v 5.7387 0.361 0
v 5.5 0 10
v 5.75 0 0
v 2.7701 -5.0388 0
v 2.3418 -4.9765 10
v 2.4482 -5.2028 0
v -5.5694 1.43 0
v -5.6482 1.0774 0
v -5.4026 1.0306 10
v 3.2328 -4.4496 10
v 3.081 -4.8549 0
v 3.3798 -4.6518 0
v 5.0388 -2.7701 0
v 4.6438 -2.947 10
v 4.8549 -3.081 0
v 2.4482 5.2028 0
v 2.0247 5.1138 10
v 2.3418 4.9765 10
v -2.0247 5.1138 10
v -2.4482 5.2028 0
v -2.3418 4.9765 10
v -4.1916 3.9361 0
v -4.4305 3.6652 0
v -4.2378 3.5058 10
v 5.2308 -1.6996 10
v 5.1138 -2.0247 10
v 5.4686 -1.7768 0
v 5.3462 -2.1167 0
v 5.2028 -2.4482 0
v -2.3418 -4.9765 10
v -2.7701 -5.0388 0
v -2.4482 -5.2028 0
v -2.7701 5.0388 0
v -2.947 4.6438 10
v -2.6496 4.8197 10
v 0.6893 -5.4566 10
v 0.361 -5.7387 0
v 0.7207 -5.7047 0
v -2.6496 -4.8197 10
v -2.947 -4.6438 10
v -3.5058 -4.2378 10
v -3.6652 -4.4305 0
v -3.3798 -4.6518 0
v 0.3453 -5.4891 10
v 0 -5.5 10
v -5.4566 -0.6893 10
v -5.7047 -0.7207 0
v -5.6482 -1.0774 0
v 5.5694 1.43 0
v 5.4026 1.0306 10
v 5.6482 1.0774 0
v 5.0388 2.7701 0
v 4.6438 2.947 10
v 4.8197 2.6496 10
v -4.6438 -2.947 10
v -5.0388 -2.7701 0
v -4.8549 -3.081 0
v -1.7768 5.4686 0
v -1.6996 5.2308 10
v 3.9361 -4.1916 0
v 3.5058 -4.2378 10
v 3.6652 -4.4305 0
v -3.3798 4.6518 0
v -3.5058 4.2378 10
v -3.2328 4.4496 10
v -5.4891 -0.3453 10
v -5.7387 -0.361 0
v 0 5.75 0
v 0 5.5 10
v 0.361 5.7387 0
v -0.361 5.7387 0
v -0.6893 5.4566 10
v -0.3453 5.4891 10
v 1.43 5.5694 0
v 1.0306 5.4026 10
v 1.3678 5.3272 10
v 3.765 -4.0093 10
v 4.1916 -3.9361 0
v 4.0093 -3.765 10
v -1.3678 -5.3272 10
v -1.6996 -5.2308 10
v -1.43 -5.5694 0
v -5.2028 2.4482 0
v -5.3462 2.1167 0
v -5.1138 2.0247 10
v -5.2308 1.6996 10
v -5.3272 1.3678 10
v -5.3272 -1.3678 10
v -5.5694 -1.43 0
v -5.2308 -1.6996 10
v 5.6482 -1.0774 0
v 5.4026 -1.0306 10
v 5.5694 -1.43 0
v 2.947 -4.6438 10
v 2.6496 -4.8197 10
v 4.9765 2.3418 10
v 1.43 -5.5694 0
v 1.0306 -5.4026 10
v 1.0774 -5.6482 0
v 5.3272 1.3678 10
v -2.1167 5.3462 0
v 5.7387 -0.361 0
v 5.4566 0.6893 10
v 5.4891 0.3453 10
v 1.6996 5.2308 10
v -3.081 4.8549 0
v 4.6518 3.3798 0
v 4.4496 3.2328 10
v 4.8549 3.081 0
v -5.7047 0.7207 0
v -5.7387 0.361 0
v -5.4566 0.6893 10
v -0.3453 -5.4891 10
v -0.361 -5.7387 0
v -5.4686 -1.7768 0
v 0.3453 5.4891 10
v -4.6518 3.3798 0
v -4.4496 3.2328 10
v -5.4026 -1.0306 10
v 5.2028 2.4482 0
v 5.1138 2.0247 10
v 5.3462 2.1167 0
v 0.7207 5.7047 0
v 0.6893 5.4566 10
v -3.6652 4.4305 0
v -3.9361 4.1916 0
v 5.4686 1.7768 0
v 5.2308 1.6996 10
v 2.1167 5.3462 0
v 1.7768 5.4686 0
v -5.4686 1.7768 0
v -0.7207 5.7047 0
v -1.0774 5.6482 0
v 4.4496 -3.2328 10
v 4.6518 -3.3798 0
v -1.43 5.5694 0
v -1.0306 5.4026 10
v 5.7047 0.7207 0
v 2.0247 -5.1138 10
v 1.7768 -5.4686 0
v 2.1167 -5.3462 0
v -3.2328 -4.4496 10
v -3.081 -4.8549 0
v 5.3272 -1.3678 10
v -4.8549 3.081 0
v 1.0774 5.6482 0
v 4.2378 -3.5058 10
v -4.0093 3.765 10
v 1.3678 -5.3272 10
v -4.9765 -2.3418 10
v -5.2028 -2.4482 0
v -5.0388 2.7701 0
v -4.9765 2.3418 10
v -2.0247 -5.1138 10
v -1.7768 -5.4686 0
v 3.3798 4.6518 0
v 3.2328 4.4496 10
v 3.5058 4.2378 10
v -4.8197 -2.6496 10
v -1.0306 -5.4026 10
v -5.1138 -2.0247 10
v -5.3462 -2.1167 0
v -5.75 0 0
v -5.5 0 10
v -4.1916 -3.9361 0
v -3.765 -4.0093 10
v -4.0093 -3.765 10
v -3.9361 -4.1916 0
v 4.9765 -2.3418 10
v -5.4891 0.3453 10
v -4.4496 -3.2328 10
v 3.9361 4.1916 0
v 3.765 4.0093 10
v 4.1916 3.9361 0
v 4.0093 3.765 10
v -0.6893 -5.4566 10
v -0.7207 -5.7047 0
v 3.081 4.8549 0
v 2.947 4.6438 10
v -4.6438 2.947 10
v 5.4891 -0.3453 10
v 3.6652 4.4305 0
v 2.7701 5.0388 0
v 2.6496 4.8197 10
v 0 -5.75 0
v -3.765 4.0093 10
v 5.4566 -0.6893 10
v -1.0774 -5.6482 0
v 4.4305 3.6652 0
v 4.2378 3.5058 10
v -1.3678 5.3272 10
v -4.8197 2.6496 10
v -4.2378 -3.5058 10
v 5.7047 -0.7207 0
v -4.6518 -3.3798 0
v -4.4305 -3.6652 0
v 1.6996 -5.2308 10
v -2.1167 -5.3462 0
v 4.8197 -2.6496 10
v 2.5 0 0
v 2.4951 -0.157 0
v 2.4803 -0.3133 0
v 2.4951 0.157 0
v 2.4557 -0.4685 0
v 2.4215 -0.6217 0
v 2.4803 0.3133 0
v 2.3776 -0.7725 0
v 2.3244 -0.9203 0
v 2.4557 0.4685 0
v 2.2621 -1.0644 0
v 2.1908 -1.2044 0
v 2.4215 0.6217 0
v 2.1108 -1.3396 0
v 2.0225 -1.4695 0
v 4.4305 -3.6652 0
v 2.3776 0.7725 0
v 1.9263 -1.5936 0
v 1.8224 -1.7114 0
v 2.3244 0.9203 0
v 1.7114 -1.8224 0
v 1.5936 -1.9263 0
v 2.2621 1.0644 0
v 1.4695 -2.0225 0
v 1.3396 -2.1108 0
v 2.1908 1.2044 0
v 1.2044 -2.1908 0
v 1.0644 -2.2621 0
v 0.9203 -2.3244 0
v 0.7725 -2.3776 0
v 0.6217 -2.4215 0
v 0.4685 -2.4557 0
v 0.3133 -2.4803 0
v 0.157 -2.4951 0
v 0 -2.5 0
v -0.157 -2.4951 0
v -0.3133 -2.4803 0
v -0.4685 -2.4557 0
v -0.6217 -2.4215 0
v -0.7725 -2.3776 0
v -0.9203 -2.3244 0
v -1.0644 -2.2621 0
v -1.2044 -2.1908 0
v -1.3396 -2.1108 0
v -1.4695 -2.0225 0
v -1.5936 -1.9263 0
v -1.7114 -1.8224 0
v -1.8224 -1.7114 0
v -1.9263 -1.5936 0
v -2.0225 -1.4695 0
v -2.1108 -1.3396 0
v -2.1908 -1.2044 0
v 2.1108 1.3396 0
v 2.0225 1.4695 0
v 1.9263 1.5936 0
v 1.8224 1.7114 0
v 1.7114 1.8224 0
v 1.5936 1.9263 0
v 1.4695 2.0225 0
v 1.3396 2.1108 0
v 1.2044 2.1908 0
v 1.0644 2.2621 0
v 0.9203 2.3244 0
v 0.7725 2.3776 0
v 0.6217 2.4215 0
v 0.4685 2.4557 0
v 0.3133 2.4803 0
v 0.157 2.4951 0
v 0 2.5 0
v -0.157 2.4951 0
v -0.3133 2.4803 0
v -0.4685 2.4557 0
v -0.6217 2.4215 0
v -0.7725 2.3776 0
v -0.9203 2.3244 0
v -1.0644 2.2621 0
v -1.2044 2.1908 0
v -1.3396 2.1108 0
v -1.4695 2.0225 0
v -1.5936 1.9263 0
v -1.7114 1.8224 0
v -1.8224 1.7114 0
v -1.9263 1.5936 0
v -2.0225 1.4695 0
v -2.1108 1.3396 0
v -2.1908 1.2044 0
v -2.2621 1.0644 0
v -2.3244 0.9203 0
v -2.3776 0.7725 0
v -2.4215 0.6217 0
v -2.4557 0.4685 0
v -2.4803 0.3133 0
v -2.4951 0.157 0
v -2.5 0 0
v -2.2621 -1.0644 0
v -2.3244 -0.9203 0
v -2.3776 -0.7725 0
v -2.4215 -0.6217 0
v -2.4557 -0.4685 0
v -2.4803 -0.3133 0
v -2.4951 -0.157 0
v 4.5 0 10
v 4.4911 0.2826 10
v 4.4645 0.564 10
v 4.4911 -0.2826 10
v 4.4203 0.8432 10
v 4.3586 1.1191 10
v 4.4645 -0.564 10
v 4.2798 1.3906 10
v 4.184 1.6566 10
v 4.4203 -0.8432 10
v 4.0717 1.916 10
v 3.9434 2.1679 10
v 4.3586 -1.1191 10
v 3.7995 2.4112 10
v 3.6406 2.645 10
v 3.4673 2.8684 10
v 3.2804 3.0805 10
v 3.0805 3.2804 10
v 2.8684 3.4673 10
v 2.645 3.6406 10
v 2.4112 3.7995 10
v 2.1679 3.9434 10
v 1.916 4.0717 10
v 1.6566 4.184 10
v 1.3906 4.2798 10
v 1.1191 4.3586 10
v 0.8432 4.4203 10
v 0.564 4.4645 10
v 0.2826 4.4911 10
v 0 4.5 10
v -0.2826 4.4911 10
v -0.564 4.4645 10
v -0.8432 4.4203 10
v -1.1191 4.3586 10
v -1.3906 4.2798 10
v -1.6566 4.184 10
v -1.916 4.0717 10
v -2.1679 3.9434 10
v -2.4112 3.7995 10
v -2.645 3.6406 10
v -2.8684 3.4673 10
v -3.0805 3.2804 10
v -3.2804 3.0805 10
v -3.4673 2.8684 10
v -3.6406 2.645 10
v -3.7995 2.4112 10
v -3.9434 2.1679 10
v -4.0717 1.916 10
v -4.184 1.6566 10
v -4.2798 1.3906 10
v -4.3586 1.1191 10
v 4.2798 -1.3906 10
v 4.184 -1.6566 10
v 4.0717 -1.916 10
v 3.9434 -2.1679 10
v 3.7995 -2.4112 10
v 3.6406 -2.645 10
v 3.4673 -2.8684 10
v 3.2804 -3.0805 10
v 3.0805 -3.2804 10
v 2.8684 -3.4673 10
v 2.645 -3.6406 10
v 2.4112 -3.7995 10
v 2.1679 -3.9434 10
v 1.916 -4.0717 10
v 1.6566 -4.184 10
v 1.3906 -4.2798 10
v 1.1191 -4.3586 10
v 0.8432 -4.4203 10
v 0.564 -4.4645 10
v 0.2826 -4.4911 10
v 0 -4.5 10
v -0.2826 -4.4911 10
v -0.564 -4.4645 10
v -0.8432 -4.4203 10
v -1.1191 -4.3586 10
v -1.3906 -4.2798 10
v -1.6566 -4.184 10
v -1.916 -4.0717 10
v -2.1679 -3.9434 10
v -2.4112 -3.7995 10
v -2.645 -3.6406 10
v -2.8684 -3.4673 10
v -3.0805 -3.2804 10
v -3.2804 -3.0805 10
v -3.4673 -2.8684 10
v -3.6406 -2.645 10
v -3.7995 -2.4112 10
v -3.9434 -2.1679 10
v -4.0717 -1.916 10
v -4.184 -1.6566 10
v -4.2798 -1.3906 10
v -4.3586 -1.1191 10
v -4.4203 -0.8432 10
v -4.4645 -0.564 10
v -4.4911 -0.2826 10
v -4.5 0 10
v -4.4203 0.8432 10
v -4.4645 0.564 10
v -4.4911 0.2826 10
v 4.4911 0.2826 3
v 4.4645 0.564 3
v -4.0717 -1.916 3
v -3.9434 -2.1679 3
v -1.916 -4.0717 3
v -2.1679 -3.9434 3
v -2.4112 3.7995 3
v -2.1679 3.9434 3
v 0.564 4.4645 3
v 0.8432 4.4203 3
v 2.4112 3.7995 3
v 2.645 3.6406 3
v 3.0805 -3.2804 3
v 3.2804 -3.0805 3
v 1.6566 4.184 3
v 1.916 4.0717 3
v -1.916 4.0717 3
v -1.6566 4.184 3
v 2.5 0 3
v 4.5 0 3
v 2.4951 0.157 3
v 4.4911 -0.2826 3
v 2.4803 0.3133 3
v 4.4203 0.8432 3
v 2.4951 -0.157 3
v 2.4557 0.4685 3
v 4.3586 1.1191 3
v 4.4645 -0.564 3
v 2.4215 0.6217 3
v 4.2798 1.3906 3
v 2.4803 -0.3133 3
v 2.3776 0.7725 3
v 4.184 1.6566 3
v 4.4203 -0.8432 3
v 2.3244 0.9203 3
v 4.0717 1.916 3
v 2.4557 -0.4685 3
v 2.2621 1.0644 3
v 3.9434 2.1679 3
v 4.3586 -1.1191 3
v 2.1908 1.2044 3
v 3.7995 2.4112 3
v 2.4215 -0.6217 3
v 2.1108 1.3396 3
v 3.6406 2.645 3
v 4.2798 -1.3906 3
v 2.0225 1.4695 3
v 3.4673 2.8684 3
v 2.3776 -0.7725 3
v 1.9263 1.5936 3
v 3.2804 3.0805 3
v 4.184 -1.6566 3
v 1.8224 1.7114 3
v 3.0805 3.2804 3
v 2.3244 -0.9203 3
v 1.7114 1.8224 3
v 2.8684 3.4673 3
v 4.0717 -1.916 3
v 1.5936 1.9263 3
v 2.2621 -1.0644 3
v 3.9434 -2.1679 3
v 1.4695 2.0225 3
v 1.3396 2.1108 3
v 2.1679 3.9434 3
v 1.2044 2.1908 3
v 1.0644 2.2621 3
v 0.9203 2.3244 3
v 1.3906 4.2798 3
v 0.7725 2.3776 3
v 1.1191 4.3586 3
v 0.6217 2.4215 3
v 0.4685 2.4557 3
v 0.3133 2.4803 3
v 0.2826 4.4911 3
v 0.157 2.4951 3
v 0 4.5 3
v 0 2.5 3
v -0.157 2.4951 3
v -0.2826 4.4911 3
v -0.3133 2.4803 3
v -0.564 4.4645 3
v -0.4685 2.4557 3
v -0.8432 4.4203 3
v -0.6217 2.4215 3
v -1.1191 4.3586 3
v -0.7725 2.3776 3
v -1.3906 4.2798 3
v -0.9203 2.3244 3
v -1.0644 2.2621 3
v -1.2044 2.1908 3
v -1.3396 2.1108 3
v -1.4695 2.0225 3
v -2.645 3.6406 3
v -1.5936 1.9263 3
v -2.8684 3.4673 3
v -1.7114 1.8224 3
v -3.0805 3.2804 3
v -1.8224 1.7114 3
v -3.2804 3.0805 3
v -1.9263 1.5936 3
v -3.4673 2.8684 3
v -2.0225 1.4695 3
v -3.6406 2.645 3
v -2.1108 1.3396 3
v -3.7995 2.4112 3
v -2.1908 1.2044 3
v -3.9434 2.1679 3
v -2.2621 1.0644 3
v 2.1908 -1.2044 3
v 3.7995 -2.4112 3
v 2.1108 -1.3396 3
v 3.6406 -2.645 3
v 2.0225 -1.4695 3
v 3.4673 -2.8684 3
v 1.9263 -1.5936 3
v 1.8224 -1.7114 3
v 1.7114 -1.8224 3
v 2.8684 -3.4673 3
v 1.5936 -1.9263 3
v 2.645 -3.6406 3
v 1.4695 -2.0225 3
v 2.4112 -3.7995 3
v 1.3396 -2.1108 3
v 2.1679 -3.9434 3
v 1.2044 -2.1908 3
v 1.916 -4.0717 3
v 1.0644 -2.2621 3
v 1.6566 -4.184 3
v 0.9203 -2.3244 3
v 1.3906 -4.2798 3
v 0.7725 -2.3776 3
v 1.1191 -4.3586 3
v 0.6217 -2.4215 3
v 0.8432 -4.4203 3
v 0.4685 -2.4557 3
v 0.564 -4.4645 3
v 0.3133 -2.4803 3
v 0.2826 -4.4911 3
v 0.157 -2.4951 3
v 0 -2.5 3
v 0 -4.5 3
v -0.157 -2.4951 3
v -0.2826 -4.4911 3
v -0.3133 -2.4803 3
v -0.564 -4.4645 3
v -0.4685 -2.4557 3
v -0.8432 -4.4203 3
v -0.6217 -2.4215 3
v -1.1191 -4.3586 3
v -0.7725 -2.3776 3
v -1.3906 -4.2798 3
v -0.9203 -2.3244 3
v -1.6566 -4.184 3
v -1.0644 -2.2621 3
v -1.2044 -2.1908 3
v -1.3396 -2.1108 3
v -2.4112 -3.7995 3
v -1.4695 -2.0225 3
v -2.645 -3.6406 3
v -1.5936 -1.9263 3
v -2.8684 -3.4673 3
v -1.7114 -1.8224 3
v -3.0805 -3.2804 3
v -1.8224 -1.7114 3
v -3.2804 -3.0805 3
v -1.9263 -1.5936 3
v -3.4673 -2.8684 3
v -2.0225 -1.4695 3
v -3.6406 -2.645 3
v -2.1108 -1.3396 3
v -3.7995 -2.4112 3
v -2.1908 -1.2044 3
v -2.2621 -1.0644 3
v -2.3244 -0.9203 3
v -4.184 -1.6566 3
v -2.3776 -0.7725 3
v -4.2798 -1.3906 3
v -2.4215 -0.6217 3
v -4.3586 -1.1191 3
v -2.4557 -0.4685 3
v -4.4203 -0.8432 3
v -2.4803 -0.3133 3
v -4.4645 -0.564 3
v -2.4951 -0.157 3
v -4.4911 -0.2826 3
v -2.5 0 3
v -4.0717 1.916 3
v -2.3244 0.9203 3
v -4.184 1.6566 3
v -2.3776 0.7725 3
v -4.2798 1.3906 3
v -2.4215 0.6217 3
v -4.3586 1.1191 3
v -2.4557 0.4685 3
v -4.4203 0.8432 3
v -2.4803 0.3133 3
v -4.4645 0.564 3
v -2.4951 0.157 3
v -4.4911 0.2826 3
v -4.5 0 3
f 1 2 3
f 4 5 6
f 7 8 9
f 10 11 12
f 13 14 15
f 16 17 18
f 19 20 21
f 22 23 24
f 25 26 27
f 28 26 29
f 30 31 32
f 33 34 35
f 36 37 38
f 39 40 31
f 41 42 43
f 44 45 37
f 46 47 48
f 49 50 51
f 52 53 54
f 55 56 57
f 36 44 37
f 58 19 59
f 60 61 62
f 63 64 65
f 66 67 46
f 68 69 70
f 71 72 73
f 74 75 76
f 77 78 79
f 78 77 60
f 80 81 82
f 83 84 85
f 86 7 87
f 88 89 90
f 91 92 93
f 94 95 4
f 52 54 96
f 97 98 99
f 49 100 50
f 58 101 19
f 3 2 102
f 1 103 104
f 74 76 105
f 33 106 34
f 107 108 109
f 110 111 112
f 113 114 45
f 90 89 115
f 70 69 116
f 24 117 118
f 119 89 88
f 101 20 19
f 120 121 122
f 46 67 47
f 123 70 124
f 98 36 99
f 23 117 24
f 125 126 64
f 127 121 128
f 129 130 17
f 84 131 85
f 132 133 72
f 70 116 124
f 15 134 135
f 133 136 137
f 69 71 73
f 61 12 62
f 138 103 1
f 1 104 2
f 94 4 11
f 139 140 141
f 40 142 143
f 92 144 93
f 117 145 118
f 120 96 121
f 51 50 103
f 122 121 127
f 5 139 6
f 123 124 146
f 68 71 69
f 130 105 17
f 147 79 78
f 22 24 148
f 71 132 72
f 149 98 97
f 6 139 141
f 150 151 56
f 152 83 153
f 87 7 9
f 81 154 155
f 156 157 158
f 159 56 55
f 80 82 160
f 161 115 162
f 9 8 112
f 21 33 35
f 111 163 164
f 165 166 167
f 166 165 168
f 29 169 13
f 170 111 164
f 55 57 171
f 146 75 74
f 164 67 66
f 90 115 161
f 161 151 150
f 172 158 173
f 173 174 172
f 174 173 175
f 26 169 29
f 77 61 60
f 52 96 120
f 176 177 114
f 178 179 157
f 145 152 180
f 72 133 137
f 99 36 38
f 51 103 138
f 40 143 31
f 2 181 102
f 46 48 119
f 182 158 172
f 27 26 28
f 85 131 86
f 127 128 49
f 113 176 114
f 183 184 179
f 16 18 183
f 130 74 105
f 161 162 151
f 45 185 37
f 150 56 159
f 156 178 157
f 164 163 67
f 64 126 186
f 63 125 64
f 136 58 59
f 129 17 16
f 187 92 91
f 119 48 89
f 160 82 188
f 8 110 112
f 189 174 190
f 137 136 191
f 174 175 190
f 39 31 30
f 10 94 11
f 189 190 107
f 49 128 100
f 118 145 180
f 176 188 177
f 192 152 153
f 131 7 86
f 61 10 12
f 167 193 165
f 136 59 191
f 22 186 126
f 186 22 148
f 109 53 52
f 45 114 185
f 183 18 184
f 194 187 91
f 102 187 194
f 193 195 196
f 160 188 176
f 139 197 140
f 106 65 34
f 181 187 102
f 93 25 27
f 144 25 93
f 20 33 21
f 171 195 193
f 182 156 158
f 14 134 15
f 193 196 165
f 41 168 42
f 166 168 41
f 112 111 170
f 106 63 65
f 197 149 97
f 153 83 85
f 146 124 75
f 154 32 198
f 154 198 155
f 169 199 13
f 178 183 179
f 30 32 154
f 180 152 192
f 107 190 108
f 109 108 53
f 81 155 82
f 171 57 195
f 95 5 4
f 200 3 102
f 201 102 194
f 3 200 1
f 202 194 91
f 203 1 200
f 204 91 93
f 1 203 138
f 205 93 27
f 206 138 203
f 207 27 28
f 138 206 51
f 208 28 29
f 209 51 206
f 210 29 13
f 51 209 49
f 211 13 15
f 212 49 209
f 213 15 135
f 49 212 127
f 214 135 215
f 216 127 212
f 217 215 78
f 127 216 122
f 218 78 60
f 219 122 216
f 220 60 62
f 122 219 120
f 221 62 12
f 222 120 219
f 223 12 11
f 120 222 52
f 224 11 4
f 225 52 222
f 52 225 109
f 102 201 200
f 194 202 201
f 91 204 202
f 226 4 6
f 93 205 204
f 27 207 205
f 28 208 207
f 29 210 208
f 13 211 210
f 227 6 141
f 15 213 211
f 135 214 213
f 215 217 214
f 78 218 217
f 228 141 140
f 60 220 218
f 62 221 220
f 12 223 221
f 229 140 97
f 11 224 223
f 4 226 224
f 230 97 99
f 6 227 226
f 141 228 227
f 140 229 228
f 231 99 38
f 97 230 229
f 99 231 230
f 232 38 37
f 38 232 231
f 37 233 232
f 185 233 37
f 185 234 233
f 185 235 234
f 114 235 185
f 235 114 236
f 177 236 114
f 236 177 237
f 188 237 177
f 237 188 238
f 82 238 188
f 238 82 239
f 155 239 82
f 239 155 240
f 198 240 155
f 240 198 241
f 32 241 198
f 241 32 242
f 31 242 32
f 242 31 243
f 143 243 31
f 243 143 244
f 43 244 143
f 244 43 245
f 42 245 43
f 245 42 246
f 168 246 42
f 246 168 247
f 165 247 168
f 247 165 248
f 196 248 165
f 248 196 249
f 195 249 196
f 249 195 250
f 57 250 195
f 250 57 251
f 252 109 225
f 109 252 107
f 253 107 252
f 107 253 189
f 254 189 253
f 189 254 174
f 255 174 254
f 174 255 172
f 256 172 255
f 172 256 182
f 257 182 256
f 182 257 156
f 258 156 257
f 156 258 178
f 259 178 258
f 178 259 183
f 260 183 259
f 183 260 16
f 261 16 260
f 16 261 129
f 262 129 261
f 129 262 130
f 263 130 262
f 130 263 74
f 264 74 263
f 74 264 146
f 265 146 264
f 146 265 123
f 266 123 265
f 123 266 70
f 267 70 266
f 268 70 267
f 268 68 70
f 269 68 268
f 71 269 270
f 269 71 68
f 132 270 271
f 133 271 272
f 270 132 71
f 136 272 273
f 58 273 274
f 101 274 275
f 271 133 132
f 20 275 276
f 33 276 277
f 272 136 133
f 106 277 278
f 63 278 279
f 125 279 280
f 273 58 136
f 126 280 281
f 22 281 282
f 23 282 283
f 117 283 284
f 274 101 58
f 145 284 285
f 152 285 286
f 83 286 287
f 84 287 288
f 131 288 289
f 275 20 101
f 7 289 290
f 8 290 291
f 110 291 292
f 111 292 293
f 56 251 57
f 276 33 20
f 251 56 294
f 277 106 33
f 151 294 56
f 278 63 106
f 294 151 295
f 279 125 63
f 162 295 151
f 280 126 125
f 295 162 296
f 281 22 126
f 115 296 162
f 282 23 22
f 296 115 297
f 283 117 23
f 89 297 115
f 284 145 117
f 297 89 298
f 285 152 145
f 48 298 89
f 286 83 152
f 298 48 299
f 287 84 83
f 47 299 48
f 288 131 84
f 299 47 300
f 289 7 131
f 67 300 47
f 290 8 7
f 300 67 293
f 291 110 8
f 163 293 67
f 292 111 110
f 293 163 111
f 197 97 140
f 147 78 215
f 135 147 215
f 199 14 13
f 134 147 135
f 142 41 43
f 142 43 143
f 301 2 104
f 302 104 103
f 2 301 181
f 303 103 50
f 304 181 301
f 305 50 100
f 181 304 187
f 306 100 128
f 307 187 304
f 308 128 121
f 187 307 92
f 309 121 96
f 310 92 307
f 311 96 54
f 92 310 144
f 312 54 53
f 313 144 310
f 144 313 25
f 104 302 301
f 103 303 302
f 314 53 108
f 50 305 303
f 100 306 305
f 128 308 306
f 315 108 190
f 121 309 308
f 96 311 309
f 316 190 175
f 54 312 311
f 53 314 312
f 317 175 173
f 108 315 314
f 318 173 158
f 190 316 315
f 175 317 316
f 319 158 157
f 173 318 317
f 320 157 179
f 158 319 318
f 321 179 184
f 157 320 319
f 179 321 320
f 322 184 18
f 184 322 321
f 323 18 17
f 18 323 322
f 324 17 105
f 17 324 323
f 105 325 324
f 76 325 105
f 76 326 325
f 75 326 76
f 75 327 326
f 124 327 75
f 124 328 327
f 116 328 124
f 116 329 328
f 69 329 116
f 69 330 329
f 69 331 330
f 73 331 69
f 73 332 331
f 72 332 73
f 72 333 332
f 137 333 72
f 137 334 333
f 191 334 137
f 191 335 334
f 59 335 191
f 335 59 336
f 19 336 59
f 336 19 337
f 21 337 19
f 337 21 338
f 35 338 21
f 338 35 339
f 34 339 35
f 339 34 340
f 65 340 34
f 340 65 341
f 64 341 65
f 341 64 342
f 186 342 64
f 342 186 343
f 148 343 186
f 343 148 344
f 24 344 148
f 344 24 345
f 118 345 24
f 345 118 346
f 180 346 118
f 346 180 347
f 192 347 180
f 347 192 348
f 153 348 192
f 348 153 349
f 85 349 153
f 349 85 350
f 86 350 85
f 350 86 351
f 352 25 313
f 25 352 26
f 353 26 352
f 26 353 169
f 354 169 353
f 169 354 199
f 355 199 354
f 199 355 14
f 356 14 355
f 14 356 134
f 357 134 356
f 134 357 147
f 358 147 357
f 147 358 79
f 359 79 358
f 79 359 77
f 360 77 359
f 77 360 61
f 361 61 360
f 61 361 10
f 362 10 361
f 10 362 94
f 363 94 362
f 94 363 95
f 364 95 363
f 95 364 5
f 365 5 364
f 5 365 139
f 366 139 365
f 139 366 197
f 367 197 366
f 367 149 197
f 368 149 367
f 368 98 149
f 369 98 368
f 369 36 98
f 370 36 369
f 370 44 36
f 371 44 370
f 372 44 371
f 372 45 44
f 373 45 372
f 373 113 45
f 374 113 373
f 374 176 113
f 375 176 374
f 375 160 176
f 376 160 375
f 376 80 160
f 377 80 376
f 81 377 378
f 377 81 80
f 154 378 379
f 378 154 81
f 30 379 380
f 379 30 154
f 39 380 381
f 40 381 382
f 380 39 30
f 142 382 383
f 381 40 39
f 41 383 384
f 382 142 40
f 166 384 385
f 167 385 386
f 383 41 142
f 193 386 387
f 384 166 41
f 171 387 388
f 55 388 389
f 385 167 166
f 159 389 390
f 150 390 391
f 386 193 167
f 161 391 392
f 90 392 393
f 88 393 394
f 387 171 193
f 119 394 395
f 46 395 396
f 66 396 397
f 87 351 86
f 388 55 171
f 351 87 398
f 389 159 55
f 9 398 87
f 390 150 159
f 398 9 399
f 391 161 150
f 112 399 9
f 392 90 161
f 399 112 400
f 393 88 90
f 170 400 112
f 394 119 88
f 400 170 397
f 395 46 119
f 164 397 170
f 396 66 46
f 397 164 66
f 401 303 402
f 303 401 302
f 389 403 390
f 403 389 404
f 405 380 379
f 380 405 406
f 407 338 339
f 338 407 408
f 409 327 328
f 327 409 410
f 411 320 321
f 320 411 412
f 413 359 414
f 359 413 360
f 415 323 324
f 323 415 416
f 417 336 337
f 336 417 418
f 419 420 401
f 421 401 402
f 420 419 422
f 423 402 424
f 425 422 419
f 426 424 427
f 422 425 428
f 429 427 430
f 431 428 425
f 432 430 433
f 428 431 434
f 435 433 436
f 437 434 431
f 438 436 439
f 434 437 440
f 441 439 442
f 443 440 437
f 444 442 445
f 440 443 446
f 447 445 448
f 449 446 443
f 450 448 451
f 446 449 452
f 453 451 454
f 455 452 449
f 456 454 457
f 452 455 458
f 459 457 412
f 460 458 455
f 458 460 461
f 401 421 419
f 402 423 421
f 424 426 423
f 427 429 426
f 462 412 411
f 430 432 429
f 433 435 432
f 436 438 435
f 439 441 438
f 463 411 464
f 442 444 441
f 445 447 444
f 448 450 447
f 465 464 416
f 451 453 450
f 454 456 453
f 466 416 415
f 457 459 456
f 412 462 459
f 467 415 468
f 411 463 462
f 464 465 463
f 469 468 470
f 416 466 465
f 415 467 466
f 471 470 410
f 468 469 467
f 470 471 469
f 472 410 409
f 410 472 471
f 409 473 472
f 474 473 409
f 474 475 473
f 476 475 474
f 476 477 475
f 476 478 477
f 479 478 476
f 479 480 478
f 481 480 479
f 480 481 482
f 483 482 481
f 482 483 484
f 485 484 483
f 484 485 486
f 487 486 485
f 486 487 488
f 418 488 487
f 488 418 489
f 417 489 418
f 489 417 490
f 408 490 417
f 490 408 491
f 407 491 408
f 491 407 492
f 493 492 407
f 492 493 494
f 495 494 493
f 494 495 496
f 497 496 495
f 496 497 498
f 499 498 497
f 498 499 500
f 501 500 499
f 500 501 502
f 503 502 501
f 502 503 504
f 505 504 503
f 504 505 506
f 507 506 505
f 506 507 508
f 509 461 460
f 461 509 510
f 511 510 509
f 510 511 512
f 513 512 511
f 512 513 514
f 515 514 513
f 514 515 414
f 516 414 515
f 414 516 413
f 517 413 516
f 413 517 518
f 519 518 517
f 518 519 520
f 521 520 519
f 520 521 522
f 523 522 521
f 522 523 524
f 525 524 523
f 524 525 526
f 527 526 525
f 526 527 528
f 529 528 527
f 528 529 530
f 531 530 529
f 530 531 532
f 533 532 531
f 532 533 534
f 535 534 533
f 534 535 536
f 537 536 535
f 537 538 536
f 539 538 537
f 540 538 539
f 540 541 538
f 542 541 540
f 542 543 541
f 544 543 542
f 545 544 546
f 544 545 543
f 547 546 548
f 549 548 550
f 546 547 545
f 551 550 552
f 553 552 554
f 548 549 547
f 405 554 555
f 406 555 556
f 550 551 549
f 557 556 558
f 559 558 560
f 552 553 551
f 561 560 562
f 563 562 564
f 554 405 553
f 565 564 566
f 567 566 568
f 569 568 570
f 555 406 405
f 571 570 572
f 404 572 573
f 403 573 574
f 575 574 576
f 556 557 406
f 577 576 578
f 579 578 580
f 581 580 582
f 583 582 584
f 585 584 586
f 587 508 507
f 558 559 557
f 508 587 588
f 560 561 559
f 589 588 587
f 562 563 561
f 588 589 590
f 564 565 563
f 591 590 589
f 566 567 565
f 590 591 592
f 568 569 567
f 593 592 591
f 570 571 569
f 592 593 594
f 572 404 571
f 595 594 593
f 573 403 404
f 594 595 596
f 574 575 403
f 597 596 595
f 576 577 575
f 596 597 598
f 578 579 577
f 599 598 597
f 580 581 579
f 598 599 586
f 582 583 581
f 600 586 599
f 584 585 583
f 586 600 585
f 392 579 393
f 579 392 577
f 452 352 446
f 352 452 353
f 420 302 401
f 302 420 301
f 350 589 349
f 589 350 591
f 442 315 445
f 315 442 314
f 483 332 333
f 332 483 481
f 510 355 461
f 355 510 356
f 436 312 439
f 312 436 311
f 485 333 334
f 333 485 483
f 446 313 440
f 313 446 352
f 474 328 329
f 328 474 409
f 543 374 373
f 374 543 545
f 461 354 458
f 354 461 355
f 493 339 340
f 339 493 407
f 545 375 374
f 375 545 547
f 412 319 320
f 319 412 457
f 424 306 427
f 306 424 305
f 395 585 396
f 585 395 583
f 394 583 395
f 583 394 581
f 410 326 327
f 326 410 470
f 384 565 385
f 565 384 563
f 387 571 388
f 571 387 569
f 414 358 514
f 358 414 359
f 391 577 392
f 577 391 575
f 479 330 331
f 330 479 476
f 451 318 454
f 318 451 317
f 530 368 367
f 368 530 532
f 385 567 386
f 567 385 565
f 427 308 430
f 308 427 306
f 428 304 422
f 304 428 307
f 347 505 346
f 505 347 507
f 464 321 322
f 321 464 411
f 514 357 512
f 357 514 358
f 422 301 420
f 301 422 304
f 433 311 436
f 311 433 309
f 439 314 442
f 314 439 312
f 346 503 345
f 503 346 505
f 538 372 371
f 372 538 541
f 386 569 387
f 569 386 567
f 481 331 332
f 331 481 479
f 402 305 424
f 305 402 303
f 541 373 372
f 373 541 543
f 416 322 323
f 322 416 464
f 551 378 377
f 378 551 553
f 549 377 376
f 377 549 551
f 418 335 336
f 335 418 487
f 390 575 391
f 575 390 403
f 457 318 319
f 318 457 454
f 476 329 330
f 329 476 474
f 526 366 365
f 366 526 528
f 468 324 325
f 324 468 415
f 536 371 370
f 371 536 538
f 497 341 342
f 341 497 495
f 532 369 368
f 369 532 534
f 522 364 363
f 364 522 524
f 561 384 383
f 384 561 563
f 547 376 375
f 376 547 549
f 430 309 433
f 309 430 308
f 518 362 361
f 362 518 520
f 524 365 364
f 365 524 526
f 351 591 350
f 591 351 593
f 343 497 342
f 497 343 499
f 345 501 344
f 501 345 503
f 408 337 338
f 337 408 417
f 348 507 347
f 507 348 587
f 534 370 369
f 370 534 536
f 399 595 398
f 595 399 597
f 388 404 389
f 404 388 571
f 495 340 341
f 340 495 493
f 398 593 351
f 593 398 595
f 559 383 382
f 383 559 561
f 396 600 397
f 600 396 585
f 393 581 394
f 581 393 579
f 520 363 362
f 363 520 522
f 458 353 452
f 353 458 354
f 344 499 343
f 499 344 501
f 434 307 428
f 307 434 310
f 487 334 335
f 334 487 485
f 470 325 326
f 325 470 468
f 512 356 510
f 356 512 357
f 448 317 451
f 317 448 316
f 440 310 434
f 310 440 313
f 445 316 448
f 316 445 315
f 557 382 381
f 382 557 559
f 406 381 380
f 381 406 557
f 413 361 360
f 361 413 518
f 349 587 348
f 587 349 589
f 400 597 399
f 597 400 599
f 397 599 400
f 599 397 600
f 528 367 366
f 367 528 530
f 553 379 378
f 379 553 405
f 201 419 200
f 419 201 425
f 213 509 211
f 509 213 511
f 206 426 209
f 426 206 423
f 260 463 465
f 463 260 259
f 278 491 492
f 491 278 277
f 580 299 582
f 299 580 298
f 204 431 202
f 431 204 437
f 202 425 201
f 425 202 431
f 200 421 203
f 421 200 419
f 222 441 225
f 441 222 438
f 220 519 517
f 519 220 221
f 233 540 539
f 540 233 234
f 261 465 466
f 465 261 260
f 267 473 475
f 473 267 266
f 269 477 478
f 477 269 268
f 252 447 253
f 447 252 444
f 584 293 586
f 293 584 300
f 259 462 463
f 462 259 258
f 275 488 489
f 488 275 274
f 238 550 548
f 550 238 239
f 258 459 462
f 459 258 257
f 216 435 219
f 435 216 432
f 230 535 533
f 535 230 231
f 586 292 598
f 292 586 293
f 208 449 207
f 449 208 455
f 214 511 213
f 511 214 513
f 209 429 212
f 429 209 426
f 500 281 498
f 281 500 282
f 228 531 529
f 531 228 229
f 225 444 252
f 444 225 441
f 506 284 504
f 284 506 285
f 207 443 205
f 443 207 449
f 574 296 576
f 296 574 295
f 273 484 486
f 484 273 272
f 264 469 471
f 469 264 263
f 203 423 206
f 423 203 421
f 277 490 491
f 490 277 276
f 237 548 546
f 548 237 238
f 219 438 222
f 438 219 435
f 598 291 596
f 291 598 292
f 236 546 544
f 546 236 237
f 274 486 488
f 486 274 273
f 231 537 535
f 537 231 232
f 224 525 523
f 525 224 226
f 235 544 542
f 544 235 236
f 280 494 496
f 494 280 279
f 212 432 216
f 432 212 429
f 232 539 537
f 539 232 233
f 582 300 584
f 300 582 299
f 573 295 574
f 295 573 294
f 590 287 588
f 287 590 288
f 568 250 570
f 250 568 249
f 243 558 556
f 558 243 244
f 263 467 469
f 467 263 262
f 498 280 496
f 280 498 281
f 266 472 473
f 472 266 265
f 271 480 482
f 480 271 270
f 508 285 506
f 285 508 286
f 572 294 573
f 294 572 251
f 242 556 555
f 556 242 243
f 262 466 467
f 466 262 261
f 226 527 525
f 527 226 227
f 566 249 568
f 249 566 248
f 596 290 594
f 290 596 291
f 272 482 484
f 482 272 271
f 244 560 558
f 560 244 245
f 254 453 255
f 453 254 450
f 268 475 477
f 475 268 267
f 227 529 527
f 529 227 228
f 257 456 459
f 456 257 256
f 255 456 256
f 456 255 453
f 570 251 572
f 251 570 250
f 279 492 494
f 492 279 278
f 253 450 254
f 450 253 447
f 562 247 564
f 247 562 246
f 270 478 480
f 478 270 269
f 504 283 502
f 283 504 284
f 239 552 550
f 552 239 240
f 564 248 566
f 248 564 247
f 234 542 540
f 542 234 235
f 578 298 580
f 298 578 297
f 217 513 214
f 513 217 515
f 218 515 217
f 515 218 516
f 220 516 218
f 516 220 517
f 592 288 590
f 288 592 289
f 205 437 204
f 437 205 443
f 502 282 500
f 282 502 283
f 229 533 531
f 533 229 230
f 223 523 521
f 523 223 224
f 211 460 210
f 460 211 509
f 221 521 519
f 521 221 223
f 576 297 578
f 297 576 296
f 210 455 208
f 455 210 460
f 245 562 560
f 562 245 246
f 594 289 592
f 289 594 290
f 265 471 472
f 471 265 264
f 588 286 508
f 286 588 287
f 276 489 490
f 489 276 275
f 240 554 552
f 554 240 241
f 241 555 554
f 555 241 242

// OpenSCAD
$fn=100;

// pen tip diameter
tipDia = 5;

// pen body diameter
dia = 11.2;

/**
 * Tip adapter for Edding 0.3mm.
*/
module eddingAdapter() {
  difference() {
    cylinder (d1=dia+0.3, d2=dia-0.2, h=10, center=true);
    translate([0,0,2]) cylinder (d=dia-2.2, h=8, center=true);
    cylinder (d=tipDia,h=50,center=true);
  }
}



/**
 * Alignment for printing.
*/
 translate([0,0,5]) rotate([0,0,0]) eddingAdapter();;
